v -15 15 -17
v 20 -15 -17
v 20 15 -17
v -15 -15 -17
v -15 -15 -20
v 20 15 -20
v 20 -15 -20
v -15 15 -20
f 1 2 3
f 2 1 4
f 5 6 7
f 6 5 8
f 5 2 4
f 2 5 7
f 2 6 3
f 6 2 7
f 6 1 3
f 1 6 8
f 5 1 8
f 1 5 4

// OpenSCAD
// file: utils.scad
module gear(n, r, h, l) {
    tooth_angle = 360 / n / 2;
    
    
    for (i = [0: n]) {
        rotate([0, 0, tooth_angle * i * 2])
        union() {
            linear_extrude(l)
            polygon([
                [0, 0],
                [r, 0],
                [r * cos(tooth_angle / 3), r * sin(tooth_angle / 3)],
                [(r-h) * cos(2 * tooth_angle / 3), (r-h) * sin(2 * tooth_angle / 3)],
                [(r-h) * cos(tooth_angle), (r-h) * sin(tooth_angle)]
            ]);
            
            linear_extrude(l)
            rotate([180, 0, 0])
            polygon([
                [0, 0],
                [r, 0],
                [r * cos(tooth_angle / 3), r * sin(tooth_angle / 3)],
                [(r-h) * cos(2 * tooth_angle / 3), (r-h) * sin(2 * tooth_angle / 3)],
                [(r-h) * cos(tooth_angle), (r-h) * sin(tooth_angle)]
            ]);
        }
    }
}

gear(8, 10, 3, 2);
// file: axis_back.scad
use <utils.scad> 

$fn = 100;

module _lock(h) {
    translate([0, 0, h])
    cylinder(1, 3, 4);
    
    translate([0, 0, h+1])
    cylinder(1, 4, 4);
    
    translate([0, 0, h+4])
    cylinder(1, 3, 4);
    
    translate([0, 0, h+5])
    cylinder(1, 4, 4);
}

module back_axis() {
    rotate([0, 90, 0])
    difference() {
        union() {
            cylinder(45, 3, 3);
            
            translate([0, 0, 2])
            cylinder(1, 3, 4);

            translate([0, 0, 3])
            cylinder(1, 4, 4);
            
            _lock(9);
            _lock(30);
        }
        
        translate([1, 1, -1])
        cube([3, 3, 3]);
        
        translate([-4, 1, -1])
        cube([3, 3, 3]);
        
        translate([-4, -4, -1])
        cube([3, 3, 3]);
        
        translate([1, -4, -1])
        cube([3, 3, 3]);
    }
}

module axis_gear() {
    difference() {
        gear(8, 8, 2, 2);
        
        translate([0, 0, -1])
        difference() {
            cylinder(4, 3, 3);
            
            translate([1, 1, -1])
            cube([2, 2, 5]);
            
            translate([1, -3, -1])
            cube([2, 2, 5]);

            translate([-3, 1, -1])
            cube([2, 2, 5]);
            
            translate([-3, -3, -1])
            cube([2, 2, 5]);
        }
    }
}

module axis_assembled() {
    rotate([22.5, 0, 0])
    union() {
        back_axis();
        
        rotate([0, 90, 0])
        %axis_gear();
    }
}

axis_assembled();
// file: differential.scad
use <utils.scad> 
use <axis_back.scad>

module axis_gears() {
    translate([7, 0, 9])
    rotate([22.5, 0, 0])
    rotate([0, 90, 0])
    gear(8, 8, 2, 2);
    
    translate([-9, 0, 9])
    rotate([22.5, 0, 0])
    rotate([0, 90, 0])
    gear(8, 8, 2, 2);
}

module gears() {
    difference() {
        union() {
            gear(8, 8, 2, 2);

            translate([0, 0, 16])
            gear(8, 8, 2, 2);
        }
        translate([0, 0, 0])
        cylinder(30, 2, 2);
    }
    
}

module spinning_gears() {
    difference() {
        union() {
            translate([-2, -1.5, -4])
            cube([15, 3, 3]);
                        
            translate([-2, -1.5, 19])
            cube([15, 3, 3]);

            translate([13, 0, 9])
            rotate([0, 90, 0])
            gear(16, 16, 3, 2);
        }
        
        translate([0, 0, 9])
        rotate([0, 90, 0])
        cylinder(40, 3.1, 3.1);
    }
    
    translate([1.9, -1.5, 0])
    cube([0.1, 3, 20]);
    
    translate([-2, -1.5, -1])
    cube([4, 3, 1]);
    
    translate([-2, -1.5, -1])
    cube([4, 3, 1]);
    
    translate([-2, -1.5, 18])
    cube([4, 3, 1]);
    
    w = 2.23;
    
    translate([-w / 2, -1.5, 0])
    cube([w, 3, 3.5]);

    translate([-w / 2, -1.5, 14.5])
    cube([w, 3, 3.5]);

    
    translate([w / 2 - 0.1, -1.5, 0])
    cube([0.1, 3, 20]);
}

module gears_holder() {
    difference() {
        translate([0, 0, 2.25])
        cylinder(13.5, 3.5, 3.5);
        
        w = 2.4;
    
        translate([-w / 2, -1.6, 0])
        cube([w, 3.2, 3.5]);
        
        translate([-w / 2, -1.6, 14.5])
        cube([w, 3.2, 3.5]);
    }
}

$fn = 100;

module differential_assembled() {   
    gears();
    axis_gears();
    spinning_gears();
    gears_holder();
    
    translate([9, 0, 9])
    %back_axis();

    rotate([0, 0, 180])
    translate([9, 0, 9])
    %back_axis();

}

differential_assembled();
// main file
use <differential.scad>;
use <axis_back.scad>;

$fn = 100;

module suspension() {
    translate([-15, -15, -20])
    cube([35, 30, 3]);
    
}

translate([0, 0, -9])
%differential_assembled();



suspension();
